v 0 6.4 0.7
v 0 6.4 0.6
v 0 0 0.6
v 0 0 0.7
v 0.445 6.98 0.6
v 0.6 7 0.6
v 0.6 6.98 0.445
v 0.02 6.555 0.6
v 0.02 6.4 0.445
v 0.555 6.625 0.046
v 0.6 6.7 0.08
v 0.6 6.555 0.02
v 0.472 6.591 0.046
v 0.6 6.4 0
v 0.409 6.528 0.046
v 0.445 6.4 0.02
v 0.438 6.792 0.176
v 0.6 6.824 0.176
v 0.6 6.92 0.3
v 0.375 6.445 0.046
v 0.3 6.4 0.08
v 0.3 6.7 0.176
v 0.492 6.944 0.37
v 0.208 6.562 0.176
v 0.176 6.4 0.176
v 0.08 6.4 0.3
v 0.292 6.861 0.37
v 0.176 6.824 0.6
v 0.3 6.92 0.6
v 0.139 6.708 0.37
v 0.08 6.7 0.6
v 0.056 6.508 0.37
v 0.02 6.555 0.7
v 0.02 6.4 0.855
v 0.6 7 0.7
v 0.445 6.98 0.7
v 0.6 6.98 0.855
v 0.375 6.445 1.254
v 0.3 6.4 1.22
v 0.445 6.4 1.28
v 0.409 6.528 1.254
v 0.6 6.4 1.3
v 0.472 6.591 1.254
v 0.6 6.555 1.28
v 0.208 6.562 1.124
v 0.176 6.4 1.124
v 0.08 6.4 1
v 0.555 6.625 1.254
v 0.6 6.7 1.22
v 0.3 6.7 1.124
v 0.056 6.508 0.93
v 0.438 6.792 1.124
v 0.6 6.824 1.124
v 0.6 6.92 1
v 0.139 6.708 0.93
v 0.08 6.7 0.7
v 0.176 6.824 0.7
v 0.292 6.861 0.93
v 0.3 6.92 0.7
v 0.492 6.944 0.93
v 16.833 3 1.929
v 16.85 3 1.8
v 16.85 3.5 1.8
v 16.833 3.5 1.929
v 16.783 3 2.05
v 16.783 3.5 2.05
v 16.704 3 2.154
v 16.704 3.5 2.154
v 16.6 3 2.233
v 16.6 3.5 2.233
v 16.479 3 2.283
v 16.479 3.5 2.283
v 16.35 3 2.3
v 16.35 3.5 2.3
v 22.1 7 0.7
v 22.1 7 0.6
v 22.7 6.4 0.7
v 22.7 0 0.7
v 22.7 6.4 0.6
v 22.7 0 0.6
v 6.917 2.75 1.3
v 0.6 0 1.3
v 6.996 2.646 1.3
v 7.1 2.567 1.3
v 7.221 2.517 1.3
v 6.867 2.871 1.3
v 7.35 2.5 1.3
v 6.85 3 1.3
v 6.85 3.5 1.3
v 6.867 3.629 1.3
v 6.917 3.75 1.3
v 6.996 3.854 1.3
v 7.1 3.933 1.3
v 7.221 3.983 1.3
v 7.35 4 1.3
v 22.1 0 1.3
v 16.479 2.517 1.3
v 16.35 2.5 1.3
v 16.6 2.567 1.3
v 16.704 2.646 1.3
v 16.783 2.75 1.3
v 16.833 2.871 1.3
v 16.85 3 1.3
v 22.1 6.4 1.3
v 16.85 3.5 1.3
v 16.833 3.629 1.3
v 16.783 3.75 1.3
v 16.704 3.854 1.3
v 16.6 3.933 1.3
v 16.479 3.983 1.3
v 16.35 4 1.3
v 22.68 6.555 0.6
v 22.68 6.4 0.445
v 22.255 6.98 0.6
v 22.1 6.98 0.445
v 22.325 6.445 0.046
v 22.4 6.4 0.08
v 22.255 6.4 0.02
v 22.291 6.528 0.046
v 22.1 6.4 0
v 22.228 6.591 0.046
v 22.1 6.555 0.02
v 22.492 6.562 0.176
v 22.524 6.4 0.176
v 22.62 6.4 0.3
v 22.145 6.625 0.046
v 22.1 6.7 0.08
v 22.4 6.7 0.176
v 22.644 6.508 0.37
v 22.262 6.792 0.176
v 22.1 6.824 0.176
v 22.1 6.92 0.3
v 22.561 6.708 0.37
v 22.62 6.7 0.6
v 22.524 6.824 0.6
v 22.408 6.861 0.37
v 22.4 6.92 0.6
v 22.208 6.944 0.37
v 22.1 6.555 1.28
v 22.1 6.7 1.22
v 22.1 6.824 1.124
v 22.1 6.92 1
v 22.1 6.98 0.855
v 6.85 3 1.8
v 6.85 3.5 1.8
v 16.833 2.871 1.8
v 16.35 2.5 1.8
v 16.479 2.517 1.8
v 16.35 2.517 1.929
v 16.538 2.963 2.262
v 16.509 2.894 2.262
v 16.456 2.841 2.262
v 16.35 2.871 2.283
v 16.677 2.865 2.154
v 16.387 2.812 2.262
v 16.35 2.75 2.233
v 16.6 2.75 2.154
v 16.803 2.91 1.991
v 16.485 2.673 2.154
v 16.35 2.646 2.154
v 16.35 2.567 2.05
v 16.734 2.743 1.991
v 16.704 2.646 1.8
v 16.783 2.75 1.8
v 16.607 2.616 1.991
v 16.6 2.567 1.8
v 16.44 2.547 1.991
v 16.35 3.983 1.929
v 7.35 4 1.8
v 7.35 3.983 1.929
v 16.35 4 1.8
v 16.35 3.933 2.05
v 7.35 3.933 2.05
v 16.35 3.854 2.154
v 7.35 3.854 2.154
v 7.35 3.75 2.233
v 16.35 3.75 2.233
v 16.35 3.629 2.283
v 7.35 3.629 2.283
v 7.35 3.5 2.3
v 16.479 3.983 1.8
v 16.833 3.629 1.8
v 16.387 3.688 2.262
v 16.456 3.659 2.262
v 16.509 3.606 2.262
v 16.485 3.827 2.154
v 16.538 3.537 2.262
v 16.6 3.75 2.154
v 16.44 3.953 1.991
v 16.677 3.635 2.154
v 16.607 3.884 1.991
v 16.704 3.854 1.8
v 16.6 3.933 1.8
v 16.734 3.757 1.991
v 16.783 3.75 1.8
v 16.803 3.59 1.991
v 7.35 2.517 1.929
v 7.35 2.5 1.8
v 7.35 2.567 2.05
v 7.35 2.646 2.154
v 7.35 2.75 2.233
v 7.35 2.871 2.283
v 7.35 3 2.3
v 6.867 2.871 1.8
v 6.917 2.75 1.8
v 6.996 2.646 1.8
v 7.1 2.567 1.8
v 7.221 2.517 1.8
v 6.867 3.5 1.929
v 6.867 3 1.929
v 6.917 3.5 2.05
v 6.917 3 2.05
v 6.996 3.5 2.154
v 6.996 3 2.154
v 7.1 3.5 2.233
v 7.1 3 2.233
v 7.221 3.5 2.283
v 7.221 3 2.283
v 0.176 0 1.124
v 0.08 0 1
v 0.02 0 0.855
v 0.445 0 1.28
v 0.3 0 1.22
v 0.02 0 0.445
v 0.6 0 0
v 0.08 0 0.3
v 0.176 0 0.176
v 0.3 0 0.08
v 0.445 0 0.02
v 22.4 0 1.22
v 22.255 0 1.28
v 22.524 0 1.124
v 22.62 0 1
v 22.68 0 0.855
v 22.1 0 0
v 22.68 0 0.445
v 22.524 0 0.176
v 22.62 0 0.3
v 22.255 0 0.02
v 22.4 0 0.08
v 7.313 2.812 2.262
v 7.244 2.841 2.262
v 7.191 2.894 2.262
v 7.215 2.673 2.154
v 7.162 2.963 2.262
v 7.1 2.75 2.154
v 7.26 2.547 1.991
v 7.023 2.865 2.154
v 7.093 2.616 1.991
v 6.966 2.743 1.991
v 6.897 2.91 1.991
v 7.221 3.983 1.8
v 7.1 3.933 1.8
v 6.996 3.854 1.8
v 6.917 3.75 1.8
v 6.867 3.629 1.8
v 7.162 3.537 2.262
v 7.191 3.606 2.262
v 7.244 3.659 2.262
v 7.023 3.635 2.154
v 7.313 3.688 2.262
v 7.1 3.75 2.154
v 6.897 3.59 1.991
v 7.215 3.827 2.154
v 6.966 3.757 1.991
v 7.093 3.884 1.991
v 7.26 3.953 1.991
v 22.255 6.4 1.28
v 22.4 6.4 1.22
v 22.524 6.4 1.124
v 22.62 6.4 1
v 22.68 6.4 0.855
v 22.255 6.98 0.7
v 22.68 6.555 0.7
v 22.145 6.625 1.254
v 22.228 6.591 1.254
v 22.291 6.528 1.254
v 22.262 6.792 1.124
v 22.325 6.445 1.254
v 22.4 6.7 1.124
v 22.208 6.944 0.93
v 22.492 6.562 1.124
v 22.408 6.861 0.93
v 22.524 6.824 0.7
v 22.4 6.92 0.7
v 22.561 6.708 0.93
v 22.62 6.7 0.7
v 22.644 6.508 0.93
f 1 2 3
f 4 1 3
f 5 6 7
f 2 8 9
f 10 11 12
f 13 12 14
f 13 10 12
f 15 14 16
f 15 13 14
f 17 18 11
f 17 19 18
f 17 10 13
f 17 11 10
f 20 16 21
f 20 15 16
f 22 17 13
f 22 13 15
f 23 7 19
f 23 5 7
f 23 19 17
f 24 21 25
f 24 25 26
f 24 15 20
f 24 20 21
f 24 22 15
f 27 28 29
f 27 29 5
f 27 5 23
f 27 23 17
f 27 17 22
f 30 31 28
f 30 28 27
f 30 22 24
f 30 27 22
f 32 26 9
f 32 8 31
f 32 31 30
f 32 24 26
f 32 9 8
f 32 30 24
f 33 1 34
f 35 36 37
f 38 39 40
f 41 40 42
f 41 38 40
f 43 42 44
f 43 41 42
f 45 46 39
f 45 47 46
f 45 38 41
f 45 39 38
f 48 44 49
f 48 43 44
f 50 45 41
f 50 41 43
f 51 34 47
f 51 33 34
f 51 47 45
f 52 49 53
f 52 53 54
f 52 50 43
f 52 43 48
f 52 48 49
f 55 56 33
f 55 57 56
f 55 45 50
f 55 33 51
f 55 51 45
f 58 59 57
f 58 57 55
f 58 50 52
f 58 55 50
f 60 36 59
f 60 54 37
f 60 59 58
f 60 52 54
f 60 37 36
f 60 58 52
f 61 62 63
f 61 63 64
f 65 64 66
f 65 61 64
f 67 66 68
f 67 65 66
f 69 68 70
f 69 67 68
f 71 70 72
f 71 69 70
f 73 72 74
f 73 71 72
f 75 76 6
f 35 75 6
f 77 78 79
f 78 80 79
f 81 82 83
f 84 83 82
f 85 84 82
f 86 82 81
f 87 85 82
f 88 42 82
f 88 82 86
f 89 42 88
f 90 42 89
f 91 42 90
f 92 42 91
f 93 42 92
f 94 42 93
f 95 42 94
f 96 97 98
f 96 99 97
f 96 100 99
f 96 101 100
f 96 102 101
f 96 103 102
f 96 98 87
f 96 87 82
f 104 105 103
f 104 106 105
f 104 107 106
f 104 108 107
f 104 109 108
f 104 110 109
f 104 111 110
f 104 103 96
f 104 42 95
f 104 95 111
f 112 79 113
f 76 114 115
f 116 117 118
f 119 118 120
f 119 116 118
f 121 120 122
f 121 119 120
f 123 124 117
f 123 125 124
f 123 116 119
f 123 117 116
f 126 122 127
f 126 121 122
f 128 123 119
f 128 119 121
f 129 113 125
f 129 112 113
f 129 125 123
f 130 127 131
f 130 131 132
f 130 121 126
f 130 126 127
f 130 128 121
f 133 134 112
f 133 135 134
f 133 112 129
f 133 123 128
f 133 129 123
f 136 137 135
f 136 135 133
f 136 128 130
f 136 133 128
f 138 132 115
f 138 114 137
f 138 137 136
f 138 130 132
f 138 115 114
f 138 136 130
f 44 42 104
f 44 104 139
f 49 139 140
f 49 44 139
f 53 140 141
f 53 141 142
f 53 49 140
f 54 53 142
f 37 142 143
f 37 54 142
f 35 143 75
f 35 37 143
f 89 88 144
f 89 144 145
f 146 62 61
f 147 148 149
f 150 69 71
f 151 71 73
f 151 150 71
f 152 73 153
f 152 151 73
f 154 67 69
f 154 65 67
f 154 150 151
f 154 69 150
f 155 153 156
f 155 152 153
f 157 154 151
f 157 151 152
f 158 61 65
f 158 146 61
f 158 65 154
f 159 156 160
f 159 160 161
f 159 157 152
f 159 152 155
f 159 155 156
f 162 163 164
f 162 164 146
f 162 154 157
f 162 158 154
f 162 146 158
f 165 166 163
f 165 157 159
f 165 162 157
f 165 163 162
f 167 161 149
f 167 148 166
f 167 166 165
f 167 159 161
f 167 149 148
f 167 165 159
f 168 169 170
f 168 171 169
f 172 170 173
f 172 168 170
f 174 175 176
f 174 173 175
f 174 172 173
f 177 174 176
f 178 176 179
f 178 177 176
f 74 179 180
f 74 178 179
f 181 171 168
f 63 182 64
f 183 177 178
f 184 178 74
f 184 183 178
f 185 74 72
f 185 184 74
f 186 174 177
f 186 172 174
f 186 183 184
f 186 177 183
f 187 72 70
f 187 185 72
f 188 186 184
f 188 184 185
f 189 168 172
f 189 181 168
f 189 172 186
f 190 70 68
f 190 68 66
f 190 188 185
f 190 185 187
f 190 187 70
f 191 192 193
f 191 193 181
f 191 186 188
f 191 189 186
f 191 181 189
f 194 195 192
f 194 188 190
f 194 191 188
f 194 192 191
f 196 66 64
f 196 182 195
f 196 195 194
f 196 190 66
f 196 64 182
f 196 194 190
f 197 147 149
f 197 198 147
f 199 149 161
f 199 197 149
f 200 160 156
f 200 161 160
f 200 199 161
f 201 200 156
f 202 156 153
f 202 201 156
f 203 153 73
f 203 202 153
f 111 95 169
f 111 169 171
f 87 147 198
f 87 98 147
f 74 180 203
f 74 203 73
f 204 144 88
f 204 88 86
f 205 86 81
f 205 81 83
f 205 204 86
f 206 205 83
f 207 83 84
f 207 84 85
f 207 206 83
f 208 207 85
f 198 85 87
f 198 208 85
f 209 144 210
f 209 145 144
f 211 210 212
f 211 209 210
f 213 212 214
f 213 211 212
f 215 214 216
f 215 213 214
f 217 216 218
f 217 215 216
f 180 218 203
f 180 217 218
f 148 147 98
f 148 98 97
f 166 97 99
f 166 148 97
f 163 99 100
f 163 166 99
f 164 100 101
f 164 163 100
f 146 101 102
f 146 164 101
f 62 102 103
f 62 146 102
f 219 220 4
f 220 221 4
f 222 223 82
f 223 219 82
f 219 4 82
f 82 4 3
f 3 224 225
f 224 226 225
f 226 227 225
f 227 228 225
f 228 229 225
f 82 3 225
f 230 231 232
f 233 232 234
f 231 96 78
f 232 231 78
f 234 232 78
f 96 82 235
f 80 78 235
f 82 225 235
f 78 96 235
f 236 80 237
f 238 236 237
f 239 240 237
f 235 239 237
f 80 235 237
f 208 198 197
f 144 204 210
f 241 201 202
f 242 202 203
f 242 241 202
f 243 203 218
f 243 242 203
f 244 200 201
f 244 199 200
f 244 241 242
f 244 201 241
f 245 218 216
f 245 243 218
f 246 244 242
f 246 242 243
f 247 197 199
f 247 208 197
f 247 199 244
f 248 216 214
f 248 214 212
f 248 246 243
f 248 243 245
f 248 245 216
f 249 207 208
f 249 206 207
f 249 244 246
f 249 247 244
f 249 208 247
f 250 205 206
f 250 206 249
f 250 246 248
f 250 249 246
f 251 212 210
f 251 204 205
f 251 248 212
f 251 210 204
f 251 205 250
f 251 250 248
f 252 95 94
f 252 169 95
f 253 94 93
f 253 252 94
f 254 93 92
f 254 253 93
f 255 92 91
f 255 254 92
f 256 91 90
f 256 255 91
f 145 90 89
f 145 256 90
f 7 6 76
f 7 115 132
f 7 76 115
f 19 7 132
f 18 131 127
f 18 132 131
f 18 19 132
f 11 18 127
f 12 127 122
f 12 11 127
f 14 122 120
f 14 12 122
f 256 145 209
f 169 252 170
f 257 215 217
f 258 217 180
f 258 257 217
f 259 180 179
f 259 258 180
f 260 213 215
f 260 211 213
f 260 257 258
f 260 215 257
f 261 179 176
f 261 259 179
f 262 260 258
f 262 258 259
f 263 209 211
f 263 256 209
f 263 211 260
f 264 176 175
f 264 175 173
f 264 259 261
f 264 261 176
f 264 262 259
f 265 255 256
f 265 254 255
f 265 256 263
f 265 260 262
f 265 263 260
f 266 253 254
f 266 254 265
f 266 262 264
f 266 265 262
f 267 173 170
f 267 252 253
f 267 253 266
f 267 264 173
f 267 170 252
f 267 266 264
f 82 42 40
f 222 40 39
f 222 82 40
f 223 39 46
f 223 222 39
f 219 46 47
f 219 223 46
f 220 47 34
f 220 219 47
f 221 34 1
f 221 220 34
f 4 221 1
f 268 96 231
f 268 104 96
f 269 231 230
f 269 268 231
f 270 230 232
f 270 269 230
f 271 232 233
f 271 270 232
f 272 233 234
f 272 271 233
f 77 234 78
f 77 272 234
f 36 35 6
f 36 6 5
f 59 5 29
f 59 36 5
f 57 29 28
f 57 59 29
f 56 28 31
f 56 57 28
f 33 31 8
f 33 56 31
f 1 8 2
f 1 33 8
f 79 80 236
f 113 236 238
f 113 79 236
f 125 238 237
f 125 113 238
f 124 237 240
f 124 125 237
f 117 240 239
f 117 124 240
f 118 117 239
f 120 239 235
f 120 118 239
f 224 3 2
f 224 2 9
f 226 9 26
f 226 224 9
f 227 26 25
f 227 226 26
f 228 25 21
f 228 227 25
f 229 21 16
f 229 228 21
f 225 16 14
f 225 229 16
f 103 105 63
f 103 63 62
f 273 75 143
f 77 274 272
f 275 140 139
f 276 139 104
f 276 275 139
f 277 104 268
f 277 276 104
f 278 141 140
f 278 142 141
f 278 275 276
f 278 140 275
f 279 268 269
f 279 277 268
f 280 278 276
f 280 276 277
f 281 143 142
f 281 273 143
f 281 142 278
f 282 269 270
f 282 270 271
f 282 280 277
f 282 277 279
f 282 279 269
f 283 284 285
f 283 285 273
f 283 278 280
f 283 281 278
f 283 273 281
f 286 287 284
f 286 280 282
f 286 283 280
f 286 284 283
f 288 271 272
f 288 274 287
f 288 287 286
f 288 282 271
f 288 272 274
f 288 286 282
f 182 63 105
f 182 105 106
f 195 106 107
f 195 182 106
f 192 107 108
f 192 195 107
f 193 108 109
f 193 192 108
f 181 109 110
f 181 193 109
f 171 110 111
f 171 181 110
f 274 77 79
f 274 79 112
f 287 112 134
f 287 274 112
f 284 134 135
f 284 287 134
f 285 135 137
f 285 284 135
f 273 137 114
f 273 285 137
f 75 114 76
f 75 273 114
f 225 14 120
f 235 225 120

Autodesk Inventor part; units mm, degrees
ref_plane "YZ Plane" through (0, 0, 0) normal (1, 0, 0) x (0, 1, 0)
ref_plane "XZ Plane" through (0, 0, 0) normal (0, 1, 0) x (-1, 0, 0)
ref_plane "XY Plane" through (0, 0, 0) normal (0, 0, 1) x (1, 0, 0)
sketch "Schizzo1" plane through (0, 0, 0) normal (0, 0, 1) x (1, 0, 0)
  line L0 (0, 0) -> (22.7, 0)
  line L1 (22.7, 0) -> (22.7, 7)
  line L2 (22.7, 7) -> (0, 7)
  line L3 (0, 7) -> (0, 0)
  dimension "d0" = 22.7
  dimension "d2" = 7
extrude "Estrusione1" add sketch "Schizzo1" along normal blind 1.3
sketch "Sketch2" plane through (0, 0, 1.3) normal (0, 0, 1) x (1, 0, 0)
  line L0 (6.85, 4) -> (16.85, 4)
  line L1 (16.85, 4) -> (16.85, 2.5)
  line L2 (16.85, 2.5) -> (6.85, 2.5)
  line L3 (6.85, 2.5) -> (6.85, 4)
  line L4 (0, 7) -> (0, 0) projected
  line L5 (0, 0) -> (22.7, 0) projected
  point P0 (0, 6.5)
  dimension "d6" = 10
  dimension "d7" = 1.5
  dimension "d8" = 6.85
  dimension "d9" = 2.5
extrude "Handle" add sketch "Sketch2" along normal blind 1
fillet "Fillet2" radius 0.5 8 edges at (16.85, 4, 1.8) (16.85, 2.5, 1.8) (6.85, 4, 1.8) (6.85, 2.5, 1.8) (11.85, 2.5, 2.3) (16.85, 3.25, 2.3) (6.85, 3.25, 2.3) (11.85, 4, 2.3)
fillet "Fillet3" radius 0.6 8 edges at (0, 7, 0.65) (22.7, 7, 0.65) (0, 3.5, 1.3) (0, 3.5, 0) (22.7, 3.5, 1.3) (22.7, 3.5, 0) (11.35, 7, 1.3) (11.35, 7, 0)
properties part number "160409 T-RH-P Box cap R23p"
